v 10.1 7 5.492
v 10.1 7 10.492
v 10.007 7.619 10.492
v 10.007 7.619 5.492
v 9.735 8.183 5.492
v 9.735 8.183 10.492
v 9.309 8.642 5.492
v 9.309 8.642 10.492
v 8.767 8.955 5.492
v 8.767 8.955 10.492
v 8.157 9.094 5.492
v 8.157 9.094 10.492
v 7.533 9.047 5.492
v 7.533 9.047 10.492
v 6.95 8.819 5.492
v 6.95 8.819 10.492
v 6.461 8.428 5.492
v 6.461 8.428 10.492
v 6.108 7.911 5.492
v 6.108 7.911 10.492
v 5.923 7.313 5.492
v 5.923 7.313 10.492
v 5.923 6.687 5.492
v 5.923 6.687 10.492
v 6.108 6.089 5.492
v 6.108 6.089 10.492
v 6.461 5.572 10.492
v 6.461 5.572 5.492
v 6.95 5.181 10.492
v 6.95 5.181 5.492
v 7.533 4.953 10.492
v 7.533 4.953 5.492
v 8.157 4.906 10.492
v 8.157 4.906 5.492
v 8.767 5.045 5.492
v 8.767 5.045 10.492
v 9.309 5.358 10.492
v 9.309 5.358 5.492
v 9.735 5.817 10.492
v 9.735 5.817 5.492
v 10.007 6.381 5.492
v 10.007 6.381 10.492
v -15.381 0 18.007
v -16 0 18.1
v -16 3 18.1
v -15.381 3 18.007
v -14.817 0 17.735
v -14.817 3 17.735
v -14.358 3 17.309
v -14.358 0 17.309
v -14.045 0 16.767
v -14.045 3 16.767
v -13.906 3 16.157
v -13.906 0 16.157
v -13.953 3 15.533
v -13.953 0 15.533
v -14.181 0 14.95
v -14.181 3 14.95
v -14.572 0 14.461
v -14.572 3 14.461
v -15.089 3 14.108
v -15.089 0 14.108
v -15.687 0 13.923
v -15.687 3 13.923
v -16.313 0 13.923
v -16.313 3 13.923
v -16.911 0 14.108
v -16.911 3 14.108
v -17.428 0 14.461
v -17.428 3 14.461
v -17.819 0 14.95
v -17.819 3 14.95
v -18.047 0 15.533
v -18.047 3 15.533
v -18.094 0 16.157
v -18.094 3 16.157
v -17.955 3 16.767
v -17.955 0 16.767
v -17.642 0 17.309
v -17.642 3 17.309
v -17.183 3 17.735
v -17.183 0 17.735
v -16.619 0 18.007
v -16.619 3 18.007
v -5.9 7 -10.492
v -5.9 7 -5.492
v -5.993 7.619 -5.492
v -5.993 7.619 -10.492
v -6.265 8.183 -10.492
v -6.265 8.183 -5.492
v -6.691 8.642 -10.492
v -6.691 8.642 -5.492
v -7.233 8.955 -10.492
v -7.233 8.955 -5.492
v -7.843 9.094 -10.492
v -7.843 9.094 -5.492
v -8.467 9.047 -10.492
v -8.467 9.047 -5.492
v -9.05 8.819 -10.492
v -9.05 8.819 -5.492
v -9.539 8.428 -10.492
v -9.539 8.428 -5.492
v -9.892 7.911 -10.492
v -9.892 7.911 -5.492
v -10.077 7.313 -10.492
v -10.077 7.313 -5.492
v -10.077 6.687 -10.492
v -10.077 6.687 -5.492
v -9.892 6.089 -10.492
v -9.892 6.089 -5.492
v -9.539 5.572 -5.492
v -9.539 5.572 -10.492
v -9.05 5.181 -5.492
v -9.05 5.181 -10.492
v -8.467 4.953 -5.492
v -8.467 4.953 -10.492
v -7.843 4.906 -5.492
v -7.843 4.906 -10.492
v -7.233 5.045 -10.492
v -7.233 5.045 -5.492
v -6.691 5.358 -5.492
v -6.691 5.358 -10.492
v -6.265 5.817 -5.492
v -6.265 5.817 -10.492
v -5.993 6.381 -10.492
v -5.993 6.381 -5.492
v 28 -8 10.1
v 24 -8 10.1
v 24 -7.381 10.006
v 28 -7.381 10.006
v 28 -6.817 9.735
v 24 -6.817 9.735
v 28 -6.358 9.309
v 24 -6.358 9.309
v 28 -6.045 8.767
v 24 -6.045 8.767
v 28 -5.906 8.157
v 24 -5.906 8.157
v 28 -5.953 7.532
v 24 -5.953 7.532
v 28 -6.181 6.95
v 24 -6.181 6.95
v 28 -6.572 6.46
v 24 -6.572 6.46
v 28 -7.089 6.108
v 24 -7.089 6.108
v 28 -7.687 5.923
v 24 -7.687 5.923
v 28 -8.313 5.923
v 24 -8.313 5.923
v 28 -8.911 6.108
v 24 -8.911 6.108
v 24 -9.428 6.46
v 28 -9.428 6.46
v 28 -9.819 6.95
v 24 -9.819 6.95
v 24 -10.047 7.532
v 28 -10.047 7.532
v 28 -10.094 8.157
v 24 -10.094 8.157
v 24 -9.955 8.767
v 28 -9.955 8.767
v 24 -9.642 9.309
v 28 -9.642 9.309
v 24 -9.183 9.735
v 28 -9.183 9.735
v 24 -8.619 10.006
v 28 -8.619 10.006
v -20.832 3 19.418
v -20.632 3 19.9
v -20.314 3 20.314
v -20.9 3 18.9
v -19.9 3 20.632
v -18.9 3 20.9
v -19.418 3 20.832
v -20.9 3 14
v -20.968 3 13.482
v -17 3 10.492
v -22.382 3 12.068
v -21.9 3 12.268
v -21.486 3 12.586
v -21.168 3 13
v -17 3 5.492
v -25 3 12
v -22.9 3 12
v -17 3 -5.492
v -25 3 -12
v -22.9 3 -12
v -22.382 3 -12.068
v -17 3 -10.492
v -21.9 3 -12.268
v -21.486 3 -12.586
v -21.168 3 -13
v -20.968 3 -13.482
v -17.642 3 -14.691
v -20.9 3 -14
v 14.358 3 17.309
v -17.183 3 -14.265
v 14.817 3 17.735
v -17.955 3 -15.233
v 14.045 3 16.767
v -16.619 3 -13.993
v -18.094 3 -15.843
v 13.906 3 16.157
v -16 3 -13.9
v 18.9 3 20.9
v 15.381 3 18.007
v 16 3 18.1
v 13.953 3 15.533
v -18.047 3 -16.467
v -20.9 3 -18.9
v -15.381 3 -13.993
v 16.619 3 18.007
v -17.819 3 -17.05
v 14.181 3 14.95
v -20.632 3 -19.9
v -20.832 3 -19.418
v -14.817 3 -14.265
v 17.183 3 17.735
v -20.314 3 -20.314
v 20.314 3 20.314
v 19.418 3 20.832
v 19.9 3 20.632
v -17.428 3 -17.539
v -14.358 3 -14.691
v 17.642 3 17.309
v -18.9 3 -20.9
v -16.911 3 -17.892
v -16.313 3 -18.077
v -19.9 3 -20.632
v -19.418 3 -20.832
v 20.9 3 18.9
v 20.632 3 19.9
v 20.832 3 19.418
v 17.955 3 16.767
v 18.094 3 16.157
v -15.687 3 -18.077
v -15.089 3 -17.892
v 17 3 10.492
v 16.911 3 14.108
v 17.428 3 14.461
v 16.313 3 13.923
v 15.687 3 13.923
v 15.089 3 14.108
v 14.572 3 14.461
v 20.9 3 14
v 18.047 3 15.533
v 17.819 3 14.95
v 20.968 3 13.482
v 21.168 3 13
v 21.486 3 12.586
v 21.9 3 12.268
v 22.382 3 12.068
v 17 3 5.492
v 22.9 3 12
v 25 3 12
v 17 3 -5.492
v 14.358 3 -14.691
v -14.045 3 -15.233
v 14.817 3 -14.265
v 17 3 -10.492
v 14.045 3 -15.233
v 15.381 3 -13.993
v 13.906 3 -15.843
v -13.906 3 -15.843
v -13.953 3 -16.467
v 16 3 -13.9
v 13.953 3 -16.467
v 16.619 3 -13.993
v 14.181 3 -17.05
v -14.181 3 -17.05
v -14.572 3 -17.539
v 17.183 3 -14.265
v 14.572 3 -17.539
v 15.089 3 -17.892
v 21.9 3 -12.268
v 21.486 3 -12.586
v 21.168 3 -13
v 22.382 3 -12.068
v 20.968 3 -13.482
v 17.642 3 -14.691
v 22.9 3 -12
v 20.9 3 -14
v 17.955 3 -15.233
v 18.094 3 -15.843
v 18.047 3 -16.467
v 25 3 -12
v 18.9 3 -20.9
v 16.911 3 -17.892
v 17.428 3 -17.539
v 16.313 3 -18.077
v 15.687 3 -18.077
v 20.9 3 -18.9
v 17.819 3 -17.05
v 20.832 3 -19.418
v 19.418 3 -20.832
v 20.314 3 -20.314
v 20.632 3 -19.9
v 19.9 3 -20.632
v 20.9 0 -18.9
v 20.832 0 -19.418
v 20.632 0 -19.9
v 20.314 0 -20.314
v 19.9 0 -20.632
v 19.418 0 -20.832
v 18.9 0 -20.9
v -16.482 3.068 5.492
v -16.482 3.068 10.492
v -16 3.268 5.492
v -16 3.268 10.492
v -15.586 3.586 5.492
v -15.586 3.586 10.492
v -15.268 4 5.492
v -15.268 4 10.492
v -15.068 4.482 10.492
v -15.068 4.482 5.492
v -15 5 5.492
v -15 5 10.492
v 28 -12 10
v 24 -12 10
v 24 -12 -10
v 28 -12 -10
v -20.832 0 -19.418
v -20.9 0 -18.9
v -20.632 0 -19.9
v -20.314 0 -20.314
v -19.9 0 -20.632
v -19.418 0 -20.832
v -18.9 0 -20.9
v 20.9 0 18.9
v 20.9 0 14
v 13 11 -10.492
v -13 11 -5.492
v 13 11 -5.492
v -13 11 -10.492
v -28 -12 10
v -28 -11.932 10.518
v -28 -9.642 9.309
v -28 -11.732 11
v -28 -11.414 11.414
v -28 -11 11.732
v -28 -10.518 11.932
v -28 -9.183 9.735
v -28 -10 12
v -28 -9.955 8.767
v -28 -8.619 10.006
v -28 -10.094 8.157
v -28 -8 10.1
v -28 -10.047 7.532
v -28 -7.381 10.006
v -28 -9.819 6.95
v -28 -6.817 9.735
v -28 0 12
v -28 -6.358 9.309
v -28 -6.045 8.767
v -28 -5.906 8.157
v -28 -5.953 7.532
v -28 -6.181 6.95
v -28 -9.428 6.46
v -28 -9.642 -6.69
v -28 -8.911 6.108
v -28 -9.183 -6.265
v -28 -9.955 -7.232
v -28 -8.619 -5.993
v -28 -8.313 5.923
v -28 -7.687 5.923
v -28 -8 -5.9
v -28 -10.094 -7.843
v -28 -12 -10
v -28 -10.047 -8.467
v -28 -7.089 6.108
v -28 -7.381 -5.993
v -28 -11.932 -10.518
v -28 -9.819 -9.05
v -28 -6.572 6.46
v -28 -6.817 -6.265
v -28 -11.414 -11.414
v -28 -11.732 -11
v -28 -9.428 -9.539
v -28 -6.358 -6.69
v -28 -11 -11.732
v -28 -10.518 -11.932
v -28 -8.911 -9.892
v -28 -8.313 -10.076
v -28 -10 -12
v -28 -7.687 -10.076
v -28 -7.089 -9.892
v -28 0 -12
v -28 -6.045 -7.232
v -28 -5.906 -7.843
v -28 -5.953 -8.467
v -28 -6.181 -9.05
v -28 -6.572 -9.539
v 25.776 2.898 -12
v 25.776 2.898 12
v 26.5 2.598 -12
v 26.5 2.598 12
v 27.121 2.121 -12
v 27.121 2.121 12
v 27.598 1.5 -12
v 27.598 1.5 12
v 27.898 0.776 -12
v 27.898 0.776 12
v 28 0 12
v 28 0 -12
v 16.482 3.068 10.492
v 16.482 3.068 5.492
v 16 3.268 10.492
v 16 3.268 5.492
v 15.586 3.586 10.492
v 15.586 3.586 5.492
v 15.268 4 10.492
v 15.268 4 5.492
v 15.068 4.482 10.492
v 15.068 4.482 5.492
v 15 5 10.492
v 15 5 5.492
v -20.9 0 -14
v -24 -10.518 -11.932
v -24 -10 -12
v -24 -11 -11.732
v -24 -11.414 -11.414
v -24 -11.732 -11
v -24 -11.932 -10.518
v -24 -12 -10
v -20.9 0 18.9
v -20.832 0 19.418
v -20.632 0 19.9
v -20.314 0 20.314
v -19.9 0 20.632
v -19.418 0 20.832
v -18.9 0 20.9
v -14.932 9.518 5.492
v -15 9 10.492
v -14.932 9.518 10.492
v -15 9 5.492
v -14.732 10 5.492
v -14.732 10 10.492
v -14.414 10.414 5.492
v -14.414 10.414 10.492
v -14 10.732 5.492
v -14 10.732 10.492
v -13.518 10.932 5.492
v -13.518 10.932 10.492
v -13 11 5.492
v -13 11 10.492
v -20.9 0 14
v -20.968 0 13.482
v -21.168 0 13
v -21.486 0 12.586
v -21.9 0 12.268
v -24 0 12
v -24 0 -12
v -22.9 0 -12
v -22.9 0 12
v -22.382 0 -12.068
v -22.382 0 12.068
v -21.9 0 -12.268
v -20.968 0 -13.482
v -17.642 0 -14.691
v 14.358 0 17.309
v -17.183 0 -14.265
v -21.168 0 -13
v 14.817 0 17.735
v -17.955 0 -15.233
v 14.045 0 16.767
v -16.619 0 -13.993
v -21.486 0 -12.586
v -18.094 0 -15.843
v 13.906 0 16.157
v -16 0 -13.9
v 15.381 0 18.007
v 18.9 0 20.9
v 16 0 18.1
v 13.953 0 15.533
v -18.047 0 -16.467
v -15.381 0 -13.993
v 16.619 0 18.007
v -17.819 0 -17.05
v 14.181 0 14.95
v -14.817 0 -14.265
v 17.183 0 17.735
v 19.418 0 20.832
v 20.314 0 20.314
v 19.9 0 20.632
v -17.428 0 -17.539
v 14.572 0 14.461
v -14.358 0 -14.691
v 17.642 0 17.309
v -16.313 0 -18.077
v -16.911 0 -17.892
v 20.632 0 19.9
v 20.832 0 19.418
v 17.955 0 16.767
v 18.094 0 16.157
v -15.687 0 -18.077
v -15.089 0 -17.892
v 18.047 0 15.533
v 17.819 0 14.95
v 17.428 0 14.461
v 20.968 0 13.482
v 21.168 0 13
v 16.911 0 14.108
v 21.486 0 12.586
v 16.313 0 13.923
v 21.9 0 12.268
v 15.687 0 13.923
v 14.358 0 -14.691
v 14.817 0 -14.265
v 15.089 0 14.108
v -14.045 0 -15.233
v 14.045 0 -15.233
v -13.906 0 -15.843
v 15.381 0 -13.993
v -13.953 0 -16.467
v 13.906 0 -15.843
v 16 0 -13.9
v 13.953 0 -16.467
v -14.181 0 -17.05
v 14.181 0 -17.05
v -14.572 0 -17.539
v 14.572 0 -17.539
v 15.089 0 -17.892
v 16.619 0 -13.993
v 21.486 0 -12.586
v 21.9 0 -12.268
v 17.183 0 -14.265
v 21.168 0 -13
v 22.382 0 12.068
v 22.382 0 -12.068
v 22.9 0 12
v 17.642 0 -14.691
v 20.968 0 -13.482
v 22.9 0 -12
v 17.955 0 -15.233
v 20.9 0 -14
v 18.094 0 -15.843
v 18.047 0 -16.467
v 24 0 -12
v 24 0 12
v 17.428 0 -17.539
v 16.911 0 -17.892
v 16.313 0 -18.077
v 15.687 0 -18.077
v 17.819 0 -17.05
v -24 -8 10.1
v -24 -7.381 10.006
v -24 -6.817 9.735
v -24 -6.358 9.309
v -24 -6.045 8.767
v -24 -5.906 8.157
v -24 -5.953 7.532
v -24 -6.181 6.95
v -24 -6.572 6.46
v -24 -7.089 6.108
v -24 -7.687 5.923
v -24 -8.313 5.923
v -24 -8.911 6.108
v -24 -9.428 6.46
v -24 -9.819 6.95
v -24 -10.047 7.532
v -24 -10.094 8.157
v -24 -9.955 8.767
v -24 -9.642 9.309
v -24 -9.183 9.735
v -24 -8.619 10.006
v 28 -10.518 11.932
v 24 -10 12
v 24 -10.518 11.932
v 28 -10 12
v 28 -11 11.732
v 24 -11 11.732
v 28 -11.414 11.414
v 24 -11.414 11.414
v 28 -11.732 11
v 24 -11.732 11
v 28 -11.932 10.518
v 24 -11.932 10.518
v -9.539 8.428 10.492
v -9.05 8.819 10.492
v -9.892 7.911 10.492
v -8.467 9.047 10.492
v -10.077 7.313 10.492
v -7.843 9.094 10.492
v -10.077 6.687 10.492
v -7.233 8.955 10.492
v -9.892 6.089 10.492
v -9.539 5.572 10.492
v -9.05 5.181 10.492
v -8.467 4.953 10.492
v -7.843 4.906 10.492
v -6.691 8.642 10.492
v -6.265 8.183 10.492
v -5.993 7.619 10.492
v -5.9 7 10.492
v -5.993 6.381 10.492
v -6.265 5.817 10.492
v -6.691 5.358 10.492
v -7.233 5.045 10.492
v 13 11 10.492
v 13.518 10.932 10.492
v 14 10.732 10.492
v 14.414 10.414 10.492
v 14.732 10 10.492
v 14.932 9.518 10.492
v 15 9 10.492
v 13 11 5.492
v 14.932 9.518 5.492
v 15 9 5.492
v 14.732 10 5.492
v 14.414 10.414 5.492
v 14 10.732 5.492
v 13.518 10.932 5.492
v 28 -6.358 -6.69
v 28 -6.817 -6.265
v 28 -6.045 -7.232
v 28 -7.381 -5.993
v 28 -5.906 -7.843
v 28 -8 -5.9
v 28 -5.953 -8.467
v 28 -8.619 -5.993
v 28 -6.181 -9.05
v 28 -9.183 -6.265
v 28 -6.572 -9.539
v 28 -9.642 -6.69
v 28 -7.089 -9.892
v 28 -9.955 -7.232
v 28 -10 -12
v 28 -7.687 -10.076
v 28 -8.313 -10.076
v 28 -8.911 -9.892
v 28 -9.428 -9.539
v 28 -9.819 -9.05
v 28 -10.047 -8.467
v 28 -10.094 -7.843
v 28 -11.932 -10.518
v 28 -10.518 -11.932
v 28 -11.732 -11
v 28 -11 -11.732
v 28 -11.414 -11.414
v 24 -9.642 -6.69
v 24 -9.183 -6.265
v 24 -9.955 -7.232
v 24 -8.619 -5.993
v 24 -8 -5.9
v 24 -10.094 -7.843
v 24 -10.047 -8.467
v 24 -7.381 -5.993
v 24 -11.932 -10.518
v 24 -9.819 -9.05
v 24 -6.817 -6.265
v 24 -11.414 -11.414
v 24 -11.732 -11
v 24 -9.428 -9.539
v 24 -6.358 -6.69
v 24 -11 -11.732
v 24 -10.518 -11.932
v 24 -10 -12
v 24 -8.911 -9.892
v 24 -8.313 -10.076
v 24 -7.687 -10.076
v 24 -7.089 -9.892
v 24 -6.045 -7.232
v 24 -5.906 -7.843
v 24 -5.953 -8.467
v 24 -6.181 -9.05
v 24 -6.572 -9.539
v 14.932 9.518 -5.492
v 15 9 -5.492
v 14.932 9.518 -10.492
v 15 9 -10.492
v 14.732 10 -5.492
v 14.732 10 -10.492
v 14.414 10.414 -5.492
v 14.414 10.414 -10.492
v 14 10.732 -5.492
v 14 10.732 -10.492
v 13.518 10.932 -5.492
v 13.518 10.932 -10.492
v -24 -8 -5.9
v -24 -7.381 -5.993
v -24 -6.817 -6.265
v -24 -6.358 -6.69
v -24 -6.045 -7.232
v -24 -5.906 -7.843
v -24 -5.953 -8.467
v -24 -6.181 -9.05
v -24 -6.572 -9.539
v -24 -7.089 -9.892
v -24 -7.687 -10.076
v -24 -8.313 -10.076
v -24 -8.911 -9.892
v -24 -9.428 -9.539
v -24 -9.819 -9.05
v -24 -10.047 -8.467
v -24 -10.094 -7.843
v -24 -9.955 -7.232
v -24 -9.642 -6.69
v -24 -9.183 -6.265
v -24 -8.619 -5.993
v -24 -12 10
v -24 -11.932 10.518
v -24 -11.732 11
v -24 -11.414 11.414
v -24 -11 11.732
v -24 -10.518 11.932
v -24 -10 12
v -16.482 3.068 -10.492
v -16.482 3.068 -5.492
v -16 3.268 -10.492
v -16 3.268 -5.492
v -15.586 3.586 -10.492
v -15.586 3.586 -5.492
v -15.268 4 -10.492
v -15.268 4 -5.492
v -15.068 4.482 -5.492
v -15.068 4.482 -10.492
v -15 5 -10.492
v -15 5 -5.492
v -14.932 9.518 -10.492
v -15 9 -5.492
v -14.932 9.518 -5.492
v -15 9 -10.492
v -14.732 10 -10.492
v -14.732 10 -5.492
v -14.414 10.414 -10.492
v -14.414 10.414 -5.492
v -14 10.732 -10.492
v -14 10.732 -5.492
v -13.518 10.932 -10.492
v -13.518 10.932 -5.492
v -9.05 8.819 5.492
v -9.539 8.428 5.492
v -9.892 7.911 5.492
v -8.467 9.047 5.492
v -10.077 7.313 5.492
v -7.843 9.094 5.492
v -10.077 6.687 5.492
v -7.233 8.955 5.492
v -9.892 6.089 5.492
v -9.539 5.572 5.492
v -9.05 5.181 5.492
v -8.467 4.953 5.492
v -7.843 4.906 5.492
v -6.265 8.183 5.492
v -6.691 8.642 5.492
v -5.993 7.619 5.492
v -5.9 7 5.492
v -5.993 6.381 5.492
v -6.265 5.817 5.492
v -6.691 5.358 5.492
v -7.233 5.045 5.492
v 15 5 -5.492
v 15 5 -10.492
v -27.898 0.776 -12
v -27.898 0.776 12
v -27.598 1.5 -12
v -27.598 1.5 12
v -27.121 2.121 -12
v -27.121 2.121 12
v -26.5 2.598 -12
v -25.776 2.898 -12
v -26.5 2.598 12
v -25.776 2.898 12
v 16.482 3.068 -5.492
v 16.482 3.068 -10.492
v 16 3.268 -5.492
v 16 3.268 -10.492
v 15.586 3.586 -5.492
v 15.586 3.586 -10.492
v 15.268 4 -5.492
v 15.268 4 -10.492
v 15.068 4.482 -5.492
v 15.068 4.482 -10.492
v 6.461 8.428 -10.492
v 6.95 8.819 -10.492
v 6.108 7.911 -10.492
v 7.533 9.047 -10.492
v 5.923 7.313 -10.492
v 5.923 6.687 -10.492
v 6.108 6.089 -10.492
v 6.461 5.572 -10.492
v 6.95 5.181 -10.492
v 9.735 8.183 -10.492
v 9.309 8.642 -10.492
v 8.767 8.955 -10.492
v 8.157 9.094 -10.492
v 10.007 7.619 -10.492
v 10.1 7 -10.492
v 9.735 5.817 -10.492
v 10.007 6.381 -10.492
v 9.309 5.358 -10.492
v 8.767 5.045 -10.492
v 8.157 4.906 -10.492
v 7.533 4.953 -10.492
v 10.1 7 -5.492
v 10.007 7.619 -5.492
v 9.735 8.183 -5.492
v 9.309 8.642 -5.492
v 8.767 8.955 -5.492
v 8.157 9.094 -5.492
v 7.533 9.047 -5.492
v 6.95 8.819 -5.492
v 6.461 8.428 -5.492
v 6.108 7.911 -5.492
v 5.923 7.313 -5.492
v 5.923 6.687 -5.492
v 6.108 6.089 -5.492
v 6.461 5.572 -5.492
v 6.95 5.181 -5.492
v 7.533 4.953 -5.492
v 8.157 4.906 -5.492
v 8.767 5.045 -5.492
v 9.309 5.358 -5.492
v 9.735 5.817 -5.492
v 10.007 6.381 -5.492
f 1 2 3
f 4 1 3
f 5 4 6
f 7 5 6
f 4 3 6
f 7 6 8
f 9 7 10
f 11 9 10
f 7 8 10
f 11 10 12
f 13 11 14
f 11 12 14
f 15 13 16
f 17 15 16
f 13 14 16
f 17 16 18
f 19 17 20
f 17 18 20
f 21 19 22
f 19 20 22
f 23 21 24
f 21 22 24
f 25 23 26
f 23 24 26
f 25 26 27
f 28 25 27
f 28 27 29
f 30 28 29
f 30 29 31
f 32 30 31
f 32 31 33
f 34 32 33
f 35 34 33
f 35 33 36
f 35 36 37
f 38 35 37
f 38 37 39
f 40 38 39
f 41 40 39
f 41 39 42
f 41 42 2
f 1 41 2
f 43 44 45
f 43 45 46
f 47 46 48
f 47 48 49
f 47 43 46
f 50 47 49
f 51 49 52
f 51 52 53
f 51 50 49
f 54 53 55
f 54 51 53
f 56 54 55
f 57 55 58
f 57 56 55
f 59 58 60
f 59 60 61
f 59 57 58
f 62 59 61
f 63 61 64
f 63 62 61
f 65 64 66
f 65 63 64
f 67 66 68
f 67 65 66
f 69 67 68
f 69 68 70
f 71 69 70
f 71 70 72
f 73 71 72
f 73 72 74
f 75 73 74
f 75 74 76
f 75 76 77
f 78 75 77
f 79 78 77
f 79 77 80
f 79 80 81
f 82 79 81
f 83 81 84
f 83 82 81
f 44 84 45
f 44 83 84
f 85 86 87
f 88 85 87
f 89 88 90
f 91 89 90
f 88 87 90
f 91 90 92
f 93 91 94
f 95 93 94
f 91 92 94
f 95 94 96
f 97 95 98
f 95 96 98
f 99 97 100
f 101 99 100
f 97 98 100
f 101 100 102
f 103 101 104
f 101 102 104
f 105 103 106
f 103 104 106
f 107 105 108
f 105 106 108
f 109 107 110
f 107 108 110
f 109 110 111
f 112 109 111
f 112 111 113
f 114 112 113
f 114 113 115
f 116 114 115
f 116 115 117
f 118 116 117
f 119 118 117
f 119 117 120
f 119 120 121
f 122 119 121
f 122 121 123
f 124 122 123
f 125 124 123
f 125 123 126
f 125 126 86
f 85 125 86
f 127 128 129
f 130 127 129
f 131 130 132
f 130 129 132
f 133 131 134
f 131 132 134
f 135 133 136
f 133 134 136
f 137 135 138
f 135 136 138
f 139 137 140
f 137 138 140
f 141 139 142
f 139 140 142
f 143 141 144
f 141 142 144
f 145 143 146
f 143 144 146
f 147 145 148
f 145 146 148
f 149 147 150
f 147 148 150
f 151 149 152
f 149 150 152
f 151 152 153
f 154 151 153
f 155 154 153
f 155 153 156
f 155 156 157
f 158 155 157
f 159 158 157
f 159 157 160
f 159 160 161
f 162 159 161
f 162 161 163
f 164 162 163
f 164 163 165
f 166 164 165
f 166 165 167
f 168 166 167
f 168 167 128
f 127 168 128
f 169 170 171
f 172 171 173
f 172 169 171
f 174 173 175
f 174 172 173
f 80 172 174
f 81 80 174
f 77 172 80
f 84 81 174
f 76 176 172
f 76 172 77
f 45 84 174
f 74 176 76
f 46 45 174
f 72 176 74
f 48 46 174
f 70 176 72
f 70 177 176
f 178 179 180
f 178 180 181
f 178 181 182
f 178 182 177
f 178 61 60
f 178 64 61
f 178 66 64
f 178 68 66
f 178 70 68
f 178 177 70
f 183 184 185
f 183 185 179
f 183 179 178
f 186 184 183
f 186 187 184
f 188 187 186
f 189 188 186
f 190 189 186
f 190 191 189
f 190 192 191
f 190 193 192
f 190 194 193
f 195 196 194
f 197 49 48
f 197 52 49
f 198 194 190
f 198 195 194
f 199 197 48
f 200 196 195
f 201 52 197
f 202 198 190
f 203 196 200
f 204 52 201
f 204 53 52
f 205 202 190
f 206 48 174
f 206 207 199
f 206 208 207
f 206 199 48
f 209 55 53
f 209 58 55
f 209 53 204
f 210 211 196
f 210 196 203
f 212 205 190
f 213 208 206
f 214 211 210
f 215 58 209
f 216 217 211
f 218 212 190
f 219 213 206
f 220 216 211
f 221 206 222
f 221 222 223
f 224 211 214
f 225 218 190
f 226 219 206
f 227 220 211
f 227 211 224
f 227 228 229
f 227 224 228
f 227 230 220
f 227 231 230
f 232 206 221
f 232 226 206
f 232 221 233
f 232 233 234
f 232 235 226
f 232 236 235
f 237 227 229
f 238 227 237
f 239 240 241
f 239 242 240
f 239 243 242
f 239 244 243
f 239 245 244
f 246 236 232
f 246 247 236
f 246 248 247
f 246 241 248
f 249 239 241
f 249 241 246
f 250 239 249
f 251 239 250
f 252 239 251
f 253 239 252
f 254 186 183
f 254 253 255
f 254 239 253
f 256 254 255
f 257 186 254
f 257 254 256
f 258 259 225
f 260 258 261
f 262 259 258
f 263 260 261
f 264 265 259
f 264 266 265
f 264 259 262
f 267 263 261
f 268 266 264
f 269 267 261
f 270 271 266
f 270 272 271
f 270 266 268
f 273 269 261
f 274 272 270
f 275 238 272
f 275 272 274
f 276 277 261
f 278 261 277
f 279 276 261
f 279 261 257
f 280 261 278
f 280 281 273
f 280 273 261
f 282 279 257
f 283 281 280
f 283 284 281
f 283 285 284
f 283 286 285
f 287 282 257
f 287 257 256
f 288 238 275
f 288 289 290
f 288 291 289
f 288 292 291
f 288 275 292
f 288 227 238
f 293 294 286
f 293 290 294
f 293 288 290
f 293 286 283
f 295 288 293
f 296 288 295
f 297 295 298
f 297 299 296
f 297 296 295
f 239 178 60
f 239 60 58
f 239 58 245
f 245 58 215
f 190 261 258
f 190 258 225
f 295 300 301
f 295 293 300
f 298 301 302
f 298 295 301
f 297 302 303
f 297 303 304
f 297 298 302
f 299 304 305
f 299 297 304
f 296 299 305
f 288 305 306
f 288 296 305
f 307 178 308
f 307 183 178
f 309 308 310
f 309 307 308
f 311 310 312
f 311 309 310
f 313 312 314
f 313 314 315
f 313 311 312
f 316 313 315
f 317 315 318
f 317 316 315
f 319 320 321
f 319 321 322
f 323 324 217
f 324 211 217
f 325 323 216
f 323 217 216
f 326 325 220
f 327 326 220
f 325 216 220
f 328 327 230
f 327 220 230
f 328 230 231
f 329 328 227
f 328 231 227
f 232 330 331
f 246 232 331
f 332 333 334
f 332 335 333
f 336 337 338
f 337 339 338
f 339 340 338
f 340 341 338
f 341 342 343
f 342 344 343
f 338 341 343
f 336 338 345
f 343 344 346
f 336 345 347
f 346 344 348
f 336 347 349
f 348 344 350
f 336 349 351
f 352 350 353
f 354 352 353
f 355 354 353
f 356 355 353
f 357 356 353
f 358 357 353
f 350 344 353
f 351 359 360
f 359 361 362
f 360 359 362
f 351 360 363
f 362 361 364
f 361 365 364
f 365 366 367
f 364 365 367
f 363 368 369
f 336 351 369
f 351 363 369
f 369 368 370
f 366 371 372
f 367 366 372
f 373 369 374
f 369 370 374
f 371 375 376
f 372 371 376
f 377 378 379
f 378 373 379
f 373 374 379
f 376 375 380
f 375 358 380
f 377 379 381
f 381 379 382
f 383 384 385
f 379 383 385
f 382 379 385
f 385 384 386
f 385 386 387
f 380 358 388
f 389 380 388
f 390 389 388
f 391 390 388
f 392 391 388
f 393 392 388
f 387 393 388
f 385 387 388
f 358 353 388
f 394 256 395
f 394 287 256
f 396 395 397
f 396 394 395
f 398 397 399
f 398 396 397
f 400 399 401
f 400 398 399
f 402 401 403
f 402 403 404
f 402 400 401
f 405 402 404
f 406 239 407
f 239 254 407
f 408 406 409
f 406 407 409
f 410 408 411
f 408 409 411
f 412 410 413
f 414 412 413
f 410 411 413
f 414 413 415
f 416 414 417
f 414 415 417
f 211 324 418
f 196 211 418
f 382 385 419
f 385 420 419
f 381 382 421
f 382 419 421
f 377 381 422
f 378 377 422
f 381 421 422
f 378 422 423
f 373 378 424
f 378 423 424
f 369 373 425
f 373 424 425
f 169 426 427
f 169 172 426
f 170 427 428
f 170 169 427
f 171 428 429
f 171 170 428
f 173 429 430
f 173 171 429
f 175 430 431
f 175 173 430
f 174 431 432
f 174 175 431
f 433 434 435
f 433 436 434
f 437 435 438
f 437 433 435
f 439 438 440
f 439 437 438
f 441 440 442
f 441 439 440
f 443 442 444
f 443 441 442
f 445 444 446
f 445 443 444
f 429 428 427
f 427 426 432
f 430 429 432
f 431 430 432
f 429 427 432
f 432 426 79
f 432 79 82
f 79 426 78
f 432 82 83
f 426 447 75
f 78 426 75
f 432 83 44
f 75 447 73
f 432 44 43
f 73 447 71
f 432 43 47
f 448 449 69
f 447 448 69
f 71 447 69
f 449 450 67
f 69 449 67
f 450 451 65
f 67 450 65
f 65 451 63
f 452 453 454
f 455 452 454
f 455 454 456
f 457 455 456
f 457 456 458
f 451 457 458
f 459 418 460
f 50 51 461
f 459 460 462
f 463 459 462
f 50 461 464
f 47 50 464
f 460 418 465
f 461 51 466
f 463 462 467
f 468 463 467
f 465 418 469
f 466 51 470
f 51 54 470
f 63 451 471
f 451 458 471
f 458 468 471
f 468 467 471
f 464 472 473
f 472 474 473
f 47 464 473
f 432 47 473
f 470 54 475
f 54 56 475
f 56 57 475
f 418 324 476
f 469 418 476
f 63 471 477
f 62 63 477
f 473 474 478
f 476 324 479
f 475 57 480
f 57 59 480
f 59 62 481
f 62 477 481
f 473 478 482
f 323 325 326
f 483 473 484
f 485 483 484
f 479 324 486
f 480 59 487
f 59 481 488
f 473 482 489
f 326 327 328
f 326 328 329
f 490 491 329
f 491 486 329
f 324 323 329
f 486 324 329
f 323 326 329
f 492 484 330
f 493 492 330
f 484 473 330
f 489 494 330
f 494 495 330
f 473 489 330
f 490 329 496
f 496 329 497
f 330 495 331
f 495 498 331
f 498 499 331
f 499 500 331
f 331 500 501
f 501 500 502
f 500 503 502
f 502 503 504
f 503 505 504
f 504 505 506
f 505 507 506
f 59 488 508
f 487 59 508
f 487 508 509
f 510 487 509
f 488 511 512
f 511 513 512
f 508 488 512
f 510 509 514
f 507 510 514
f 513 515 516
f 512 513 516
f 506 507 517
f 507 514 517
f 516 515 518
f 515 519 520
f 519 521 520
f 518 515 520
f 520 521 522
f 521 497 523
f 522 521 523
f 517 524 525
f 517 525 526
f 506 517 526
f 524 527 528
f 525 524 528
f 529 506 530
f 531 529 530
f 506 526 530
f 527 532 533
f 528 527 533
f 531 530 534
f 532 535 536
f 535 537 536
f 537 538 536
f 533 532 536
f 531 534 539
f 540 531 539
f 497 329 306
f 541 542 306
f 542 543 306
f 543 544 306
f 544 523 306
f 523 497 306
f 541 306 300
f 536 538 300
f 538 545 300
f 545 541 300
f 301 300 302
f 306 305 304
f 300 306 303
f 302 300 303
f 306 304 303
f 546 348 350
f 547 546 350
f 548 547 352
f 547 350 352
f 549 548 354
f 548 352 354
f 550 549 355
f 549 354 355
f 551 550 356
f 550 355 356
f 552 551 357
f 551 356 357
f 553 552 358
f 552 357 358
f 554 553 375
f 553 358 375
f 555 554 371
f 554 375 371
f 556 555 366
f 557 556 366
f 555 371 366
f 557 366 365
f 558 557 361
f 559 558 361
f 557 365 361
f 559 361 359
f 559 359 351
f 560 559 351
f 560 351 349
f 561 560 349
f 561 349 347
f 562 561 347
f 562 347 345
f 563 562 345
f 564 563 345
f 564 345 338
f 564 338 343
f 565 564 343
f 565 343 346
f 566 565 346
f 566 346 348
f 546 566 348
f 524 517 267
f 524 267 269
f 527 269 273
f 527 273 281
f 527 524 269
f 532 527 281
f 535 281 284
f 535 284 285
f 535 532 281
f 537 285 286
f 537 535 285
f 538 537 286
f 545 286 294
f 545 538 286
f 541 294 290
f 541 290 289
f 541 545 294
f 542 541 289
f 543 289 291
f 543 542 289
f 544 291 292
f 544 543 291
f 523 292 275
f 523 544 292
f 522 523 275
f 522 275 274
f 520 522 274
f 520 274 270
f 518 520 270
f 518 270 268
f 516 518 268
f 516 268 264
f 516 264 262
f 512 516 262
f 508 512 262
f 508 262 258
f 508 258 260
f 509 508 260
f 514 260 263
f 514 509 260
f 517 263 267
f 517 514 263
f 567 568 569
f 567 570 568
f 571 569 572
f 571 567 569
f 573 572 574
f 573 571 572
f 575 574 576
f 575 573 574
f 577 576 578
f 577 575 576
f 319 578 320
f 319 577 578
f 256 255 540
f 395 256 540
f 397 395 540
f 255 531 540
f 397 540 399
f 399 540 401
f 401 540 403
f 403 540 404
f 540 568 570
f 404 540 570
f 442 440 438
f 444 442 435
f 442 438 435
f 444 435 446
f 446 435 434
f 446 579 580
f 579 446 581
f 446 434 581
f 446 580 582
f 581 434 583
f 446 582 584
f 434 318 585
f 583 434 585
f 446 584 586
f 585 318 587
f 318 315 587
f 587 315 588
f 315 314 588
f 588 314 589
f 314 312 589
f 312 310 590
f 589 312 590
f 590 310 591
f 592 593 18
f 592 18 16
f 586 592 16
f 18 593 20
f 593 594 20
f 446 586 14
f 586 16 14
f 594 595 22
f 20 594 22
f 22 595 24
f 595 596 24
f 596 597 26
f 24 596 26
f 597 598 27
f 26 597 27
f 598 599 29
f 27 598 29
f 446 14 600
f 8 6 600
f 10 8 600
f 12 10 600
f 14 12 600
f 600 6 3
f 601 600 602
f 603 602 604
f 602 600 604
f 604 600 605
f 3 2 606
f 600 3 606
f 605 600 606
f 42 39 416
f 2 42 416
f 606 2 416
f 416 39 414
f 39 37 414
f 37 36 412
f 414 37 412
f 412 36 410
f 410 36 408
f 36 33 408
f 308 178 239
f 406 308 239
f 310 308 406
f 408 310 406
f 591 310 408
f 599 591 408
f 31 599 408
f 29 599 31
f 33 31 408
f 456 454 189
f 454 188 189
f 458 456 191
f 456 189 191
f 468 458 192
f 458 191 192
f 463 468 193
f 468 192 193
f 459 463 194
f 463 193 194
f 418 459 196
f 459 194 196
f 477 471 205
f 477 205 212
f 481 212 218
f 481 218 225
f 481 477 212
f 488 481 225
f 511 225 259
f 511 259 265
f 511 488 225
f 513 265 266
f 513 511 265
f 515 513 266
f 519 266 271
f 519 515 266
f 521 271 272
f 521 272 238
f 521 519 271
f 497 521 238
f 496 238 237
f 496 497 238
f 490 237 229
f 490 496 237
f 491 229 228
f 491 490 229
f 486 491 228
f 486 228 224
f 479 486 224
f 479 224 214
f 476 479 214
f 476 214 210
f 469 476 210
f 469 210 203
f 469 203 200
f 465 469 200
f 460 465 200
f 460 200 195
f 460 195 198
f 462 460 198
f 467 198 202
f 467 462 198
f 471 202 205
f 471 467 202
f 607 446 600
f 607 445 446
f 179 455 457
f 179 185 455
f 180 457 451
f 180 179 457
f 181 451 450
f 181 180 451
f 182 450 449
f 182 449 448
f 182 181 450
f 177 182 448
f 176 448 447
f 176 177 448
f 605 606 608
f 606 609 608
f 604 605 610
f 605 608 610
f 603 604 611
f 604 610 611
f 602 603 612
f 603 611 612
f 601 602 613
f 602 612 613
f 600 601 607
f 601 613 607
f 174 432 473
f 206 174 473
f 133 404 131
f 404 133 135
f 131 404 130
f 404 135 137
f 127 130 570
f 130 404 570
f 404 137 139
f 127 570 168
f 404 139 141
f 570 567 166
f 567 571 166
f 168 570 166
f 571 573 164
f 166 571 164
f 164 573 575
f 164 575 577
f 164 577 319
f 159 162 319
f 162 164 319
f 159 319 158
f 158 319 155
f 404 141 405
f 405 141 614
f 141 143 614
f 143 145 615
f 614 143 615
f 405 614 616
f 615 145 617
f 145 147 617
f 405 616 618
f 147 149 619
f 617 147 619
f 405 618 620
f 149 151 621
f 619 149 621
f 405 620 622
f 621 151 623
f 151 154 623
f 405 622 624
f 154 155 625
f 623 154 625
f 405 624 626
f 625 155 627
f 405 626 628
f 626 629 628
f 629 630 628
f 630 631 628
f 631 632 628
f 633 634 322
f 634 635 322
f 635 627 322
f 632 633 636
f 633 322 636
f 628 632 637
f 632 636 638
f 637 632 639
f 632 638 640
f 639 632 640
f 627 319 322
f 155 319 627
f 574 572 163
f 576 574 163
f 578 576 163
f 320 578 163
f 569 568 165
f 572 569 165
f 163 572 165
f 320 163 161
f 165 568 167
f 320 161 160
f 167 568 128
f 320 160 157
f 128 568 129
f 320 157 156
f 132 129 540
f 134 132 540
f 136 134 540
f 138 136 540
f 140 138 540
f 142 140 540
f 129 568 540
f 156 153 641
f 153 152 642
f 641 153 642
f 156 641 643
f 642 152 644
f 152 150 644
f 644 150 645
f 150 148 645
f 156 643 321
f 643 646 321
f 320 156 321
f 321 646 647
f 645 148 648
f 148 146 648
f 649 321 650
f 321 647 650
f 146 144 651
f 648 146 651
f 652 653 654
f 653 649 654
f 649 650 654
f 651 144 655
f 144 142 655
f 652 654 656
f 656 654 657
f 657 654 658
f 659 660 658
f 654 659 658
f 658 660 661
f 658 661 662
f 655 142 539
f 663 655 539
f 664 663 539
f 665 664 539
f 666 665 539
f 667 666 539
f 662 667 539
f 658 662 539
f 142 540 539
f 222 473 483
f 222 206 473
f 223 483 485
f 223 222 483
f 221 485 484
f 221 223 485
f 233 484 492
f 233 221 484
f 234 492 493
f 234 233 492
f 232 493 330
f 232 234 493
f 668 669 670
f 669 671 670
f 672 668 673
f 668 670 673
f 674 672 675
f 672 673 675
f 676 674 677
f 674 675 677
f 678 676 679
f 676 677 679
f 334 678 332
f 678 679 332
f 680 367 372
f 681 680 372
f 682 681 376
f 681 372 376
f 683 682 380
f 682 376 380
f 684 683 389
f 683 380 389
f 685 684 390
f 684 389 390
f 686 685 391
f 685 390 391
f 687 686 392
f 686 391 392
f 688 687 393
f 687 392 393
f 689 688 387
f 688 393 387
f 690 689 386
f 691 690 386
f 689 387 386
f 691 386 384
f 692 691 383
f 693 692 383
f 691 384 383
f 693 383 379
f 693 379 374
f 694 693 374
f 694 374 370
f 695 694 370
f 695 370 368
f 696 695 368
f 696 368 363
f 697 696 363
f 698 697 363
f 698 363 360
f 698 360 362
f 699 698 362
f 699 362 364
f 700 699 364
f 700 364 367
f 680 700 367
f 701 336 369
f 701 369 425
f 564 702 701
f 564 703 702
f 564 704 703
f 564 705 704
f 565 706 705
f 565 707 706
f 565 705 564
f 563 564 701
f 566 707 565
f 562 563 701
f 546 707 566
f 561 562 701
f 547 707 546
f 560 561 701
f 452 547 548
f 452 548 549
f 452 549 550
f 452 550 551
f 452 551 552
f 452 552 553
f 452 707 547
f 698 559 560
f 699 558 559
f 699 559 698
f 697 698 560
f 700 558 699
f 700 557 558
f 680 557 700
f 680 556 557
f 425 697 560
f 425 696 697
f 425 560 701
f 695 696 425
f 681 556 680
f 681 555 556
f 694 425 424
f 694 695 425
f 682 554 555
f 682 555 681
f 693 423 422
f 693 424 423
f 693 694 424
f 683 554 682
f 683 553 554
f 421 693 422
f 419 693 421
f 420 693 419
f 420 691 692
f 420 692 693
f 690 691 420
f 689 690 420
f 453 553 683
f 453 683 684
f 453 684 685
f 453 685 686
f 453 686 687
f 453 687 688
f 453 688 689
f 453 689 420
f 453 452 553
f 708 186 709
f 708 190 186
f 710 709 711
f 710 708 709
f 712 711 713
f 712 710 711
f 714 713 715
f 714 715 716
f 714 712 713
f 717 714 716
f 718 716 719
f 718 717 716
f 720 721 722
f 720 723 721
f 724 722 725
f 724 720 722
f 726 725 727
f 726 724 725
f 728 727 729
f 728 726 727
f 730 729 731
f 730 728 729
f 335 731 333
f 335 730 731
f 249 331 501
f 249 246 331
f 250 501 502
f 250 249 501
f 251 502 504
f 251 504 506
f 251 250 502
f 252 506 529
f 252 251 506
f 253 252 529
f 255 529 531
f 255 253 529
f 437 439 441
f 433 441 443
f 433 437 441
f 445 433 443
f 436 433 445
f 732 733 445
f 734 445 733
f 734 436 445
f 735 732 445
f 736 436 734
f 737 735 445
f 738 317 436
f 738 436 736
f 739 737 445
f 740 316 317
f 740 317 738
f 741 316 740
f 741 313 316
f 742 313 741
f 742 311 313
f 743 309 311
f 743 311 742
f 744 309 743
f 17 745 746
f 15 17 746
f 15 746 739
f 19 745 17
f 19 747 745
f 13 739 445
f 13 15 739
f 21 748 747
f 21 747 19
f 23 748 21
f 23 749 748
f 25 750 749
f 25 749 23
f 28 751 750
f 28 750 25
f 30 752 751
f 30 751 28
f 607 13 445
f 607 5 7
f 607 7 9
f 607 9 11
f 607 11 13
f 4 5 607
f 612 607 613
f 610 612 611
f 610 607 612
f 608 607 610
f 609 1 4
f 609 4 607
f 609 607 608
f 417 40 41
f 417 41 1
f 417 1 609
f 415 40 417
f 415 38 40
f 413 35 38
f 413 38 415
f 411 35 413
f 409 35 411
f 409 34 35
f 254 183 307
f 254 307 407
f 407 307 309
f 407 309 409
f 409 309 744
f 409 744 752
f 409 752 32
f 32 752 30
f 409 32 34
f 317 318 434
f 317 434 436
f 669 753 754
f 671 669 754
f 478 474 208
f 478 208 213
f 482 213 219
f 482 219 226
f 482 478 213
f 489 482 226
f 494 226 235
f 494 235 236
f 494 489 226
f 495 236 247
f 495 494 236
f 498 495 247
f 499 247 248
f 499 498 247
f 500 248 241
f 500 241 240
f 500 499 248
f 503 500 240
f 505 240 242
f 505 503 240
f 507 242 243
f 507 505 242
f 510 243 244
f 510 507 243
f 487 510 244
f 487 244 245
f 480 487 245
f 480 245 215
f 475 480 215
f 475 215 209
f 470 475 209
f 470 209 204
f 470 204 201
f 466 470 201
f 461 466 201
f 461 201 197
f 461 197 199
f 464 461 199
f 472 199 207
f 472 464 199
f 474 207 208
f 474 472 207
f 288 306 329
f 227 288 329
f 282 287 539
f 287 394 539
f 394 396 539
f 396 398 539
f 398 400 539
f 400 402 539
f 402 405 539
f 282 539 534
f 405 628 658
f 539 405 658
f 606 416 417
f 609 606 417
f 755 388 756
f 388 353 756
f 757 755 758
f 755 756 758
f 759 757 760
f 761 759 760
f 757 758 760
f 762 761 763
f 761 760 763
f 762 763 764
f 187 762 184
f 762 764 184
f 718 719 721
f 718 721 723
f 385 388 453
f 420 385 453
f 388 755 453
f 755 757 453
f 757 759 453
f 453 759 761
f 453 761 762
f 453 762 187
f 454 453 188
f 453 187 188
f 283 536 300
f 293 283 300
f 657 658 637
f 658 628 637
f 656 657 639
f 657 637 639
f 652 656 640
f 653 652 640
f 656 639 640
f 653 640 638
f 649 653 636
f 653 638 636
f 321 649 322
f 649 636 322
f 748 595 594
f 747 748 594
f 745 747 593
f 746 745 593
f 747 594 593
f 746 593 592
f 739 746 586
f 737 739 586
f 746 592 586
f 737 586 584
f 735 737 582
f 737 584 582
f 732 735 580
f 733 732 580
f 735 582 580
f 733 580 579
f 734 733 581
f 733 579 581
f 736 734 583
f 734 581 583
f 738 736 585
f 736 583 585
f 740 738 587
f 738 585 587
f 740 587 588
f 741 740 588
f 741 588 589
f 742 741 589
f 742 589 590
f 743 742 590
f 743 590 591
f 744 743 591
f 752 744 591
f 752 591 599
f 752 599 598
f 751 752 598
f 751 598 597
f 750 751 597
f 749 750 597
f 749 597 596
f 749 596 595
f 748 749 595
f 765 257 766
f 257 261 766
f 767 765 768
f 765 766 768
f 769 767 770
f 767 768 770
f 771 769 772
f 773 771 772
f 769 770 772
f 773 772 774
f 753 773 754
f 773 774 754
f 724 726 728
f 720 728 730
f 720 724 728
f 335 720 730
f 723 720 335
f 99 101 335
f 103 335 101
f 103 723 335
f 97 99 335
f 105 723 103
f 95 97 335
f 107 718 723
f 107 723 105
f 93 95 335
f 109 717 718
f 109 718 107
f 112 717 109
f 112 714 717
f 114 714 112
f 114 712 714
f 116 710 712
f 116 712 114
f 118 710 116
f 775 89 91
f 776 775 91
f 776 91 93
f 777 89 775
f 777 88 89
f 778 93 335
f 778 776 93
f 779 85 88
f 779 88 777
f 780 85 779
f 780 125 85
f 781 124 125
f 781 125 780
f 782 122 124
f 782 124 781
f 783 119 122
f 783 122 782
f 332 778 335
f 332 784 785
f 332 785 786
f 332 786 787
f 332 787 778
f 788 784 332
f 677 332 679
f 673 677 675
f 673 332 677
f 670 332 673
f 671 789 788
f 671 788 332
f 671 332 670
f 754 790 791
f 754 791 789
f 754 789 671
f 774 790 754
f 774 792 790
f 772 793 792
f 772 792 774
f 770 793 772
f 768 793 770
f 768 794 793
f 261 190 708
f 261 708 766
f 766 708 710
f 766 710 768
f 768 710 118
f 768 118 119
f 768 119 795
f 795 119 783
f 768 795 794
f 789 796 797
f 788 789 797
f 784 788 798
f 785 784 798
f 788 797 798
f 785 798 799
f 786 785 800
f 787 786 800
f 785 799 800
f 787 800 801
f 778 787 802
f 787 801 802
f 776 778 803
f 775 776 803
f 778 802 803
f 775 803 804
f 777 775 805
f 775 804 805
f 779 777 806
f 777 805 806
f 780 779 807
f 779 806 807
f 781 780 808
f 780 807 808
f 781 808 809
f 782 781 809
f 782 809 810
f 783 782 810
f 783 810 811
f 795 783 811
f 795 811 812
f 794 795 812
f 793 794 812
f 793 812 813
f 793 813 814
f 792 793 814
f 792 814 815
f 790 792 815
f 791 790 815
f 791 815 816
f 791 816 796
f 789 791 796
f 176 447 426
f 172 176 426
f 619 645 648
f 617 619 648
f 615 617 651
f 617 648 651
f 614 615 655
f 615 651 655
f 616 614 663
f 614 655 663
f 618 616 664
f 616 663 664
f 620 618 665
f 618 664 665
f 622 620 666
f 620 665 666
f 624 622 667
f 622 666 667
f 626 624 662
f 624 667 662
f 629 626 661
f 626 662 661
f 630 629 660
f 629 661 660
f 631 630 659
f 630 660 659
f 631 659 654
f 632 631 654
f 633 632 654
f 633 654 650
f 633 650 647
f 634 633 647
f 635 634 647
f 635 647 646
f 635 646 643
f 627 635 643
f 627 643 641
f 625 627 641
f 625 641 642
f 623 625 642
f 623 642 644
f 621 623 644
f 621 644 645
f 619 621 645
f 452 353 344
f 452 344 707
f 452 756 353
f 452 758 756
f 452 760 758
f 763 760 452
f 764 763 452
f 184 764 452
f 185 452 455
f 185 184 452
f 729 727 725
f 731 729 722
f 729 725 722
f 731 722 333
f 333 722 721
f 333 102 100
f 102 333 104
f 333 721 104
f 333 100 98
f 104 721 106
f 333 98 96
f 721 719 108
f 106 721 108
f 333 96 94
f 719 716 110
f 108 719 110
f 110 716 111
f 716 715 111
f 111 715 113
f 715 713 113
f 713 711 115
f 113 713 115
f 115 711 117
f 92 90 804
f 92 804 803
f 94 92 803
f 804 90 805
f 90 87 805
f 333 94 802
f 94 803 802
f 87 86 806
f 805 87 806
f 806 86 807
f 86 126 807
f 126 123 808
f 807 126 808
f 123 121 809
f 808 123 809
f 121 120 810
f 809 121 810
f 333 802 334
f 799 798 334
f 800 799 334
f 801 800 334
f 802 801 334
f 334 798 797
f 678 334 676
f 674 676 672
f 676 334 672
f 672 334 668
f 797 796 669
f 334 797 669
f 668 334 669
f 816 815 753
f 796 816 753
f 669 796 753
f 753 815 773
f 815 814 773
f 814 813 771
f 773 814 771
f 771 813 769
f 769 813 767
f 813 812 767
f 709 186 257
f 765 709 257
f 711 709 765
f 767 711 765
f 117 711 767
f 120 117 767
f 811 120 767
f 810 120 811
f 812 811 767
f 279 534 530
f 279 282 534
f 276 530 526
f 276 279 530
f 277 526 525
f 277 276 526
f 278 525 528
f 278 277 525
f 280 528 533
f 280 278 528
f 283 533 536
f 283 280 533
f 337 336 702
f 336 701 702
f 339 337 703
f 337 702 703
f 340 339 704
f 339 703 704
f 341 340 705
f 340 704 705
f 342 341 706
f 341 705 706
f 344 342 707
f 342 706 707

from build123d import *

# Parameters (mm, degrees)
SKETCH1_R           = 2.1
BOSS_EXTRUDE1_DEPTH = 3
SKETCH2_W           = 4
SKETCH2_H           = 24
BOSS_EXTRUDE2_DEPTH = 15
SKETCH5_R           = 2.1
CUT_EXTRUDE3_DEPTH  = 65
FILLET2_R           = 2
FILLET3_R           = 3
SKETCH6_W           = 30
SKETCH6_H           = 5
BOSS_EXTRUDE3_DEPTH = 8
FILLET5_R           = 2
SKETCH9_R           = 2.1
CUT_EXTRUDE8_DEPTH  = 34


with BuildPart() as part:
    # Sketch1 → Boss-Extrude1 (new body)
    with BuildSketch(Plane(origin=(0, 0, 0), x_dir=(1, 0, 0), z_dir=(0, 1, 0))):
        Polygon((-20.9, -20.9), (20.9, -20.9), (20.9, -12), (28, -12), (28, 12), (20.9, 12), (20.9, 20.9), (-20.9, 20.9), (-20.9, 12), (-28, 12), (-28, -12), (-20.9, -12), align=None)
        with Locations(Location((-16, 16, 0), (0, 0, 270))):
            Circle(SKETCH1_R, mode=Mode.SUBTRACT)
        with Locations(Location((16, 16, 0), (0, 0, 270))):
            Circle(SKETCH1_R, mode=Mode.SUBTRACT)
        with Locations(Location((16, -16, 0), (0, 0, 270))):
            Circle(SKETCH1_R, mode=Mode.SUBTRACT)
        with Locations(Location((-16, -16, 0), (0, 0, 270))):
            Circle(SKETCH1_R, mode=Mode.SUBTRACT)
    extrude(amount=BOSS_EXTRUDE1_DEPTH)

    # Sketch2 → Boss-Extrude2 (add)
    with BuildSketch(Plane(origin=(0, 3, 0), x_dir=(1, 0, 0), z_dir=(0, 1, 0))):
        with Locations((-26, 0)):
            Rectangle(SKETCH2_W, SKETCH2_H)
        with Locations((26, 0)):
            Rectangle(SKETCH2_W, SKETCH2_H)
    extrude(amount=-BOSS_EXTRUDE2_DEPTH)

    # Sketch5 → Cut-Extrude3 (cut)
    with BuildSketch(Plane.ZY.offset(28)):
        with Locations((-7.999616758, -8)):
            Circle(SKETCH5_R)
        with Locations((7.999616758, -8)):
            Circle(SKETCH5_R)
    extrude(amount=-CUT_EXTRUDE3_DEPTH, mode=Mode.SUBTRACT)

    # Fillet2
    fillet2_edges = [part.edges().sort_by_distance(p)[0] for p in [
        (-20.9, 1.5, -12),
        (-20.9, 1.5, -20.9),
        (20.9, 1.5, -20.9),
        (20.9, 1.5, -12),
        (20.9, 1.5, 12),
        (20.9, 1.5, 20.9),
        (-20.9, 1.5, 20.9),
        (-20.9, 1.5, 12),
        (-26, -12, -12),
        (-26, -12, 12),
        (26, -12, 12),
        (26, -12, -12),
    ]]
    fillet(fillet2_edges, radius=FILLET2_R)

    # Fillet3
    fillet3_edges = [part.edges().sort_by_distance(p)[0] for p in [
        (28, 3, 0),
        (-28, 3, 0),
    ]]
    fillet(fillet3_edges, radius=FILLET3_R)

    # Sketch6 → Boss-Extrude3 (add)
    with BuildSketch(Plane(origin=(0, 3, 0), x_dir=(1, 0, 0), z_dir=(0, 1, 0))):
        with Locations((0, 7.992313958)):
            Rectangle(SKETCH6_W, SKETCH6_H)
        with Locations((0, -7.992313958)):
            Rectangle(SKETCH6_W, SKETCH6_H)
    extrude(amount=BOSS_EXTRUDE3_DEPTH)

    # Fillet5
    fillet5_edges = [part.edges().sort_by_distance(p)[0] for p in [
        (15, 3, 7.992313958),
        (-15, 3, 7.992313958),
        (15, 11, 7.992313958),
        (-15, 11, 7.992313958),
        (-15, 3, -7.992313958),
        (15, 3, -7.992313958),
        (-15, 11, -7.992313958),
        (15, 11, -7.992313958),
    ]]
    fillet(fillet5_edges, radius=FILLET5_R)

    # Sketch9 → Cut-Extrude8 (cut)
    with BuildSketch(Plane.XY.offset(10.492313958)):
        with Locations((-8, 7)):
            Circle(SKETCH9_R)
        with Locations((8, 7)):
            Circle(SKETCH9_R)
    extrude(amount=-CUT_EXTRUDE8_DEPTH, mode=Mode.SUBTRACT)


solid = part.part
